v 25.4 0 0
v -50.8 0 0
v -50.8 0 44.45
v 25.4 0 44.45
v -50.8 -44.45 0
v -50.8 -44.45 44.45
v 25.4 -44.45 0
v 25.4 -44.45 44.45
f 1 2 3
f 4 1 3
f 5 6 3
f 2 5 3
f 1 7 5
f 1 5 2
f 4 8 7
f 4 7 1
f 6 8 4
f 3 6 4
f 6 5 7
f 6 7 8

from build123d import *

# Parameters (mm, degrees)
F0_W      = 44.45
F0_H      = 44.45
F1_DEPTH  = 25.4
F2_DEPTH  = 25.4
F1_FACE_W = 44.45
F1_FACE_H = 44.45
F3_DEPTH  = 76.2


with BuildPart() as f1:
    # F0 (on Right) → F1 (new body)
    with BuildSketch(Plane.YZ):
        with Locations((-22.225, 22.225)):
            Rectangle(F0_W, F0_H)
    extrude(amount=F1_DEPTH)

    # F0 (on Right) → F2 (join)
    with BuildSketch(Plane.YZ):
        with Locations((-22.225, 22.225)):
            Rectangle(F0_W, F0_H)
    extrude(amount=F2_DEPTH)

    # F1_face (on face) → F3 (join)
    with BuildSketch(Plane(origin=(25.4, -22.225, 22.225), x_dir=(0, 1, 0), z_dir=(1, 0, 0))):
        Rectangle(F1_FACE_W, F1_FACE_H)
    extrude(amount=-F3_DEPTH)


solid = f1.part
